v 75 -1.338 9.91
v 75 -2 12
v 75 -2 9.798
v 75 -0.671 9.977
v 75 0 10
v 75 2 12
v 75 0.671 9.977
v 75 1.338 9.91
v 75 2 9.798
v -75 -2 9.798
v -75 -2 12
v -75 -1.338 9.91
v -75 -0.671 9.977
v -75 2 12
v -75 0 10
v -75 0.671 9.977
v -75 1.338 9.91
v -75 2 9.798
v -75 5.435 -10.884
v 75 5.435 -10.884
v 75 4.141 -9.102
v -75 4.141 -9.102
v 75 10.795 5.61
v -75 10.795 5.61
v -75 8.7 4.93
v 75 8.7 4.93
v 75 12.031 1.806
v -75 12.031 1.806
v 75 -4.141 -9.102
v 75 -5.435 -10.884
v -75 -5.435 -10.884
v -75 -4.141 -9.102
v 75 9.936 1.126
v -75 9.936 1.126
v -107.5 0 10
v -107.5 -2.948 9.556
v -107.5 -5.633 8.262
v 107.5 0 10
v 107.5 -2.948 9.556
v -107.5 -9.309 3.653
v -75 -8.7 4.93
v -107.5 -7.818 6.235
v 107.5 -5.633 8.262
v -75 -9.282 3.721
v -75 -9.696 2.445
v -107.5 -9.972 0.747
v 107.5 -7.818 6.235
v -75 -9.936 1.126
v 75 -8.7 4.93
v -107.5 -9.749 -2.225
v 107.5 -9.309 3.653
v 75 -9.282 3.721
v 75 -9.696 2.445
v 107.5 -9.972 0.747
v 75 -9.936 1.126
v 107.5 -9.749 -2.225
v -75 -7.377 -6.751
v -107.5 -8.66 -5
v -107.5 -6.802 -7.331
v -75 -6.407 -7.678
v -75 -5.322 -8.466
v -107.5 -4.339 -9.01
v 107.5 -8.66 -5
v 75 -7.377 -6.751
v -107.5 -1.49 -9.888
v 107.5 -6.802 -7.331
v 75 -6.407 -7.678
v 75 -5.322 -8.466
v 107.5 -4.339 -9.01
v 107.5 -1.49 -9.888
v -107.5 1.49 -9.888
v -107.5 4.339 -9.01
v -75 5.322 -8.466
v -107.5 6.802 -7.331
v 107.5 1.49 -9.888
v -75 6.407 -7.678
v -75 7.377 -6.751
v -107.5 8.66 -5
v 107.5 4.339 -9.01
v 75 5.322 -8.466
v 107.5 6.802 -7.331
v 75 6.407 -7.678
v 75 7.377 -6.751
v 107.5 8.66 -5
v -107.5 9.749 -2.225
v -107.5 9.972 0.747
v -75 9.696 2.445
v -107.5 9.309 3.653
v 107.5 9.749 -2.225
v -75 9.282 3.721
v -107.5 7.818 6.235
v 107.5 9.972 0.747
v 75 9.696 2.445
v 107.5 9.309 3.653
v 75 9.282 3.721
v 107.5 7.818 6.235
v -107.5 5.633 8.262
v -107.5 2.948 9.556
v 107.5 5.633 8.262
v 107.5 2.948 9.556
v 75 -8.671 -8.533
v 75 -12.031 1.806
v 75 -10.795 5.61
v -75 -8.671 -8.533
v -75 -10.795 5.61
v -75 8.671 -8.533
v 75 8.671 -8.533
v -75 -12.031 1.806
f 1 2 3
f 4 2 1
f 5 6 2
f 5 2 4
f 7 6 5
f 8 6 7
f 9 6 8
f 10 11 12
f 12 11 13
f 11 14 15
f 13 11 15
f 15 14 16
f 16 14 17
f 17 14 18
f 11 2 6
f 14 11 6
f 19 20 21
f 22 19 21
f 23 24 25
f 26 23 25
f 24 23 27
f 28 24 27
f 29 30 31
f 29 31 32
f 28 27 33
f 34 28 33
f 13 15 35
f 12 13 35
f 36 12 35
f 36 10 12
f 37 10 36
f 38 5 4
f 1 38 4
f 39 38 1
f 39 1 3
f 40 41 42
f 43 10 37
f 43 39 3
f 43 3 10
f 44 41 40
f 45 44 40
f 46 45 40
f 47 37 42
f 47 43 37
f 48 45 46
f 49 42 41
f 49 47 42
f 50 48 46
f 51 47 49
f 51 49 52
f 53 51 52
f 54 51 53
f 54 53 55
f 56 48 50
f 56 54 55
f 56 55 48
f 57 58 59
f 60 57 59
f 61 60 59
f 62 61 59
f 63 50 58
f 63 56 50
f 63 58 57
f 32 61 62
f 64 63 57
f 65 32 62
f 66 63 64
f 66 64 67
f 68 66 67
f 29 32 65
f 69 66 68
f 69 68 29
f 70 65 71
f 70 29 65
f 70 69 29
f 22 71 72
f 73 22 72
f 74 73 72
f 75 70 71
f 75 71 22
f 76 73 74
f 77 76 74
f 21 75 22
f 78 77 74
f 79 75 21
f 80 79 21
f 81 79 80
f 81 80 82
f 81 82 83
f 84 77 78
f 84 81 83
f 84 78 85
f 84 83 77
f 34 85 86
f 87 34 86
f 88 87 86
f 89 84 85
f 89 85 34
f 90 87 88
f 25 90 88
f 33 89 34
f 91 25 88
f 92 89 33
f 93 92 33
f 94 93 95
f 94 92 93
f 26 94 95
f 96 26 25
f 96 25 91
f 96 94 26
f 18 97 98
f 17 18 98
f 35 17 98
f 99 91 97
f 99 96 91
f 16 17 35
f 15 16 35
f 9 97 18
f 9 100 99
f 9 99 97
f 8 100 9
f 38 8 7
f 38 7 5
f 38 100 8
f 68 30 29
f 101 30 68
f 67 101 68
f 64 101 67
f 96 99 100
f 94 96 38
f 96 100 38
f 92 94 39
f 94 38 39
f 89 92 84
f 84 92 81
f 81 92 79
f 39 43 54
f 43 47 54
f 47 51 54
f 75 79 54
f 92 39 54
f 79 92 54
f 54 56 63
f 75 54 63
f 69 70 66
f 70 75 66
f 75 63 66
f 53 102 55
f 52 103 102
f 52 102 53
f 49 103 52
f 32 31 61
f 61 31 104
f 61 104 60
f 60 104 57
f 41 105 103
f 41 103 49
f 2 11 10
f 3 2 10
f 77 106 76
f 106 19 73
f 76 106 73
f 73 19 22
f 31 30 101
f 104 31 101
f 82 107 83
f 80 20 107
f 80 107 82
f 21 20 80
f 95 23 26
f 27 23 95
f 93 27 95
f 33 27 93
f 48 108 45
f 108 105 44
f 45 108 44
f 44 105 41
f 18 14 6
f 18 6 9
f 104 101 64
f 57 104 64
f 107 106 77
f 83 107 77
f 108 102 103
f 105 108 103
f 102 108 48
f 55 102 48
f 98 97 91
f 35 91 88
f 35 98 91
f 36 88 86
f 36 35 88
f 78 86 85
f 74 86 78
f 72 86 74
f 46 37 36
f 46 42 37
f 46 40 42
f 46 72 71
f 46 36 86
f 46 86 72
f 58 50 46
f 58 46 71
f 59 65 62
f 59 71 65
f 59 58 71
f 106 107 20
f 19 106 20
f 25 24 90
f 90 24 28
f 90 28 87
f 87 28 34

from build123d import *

# Parameters (mm, degrees)
SKETCH1_W           = 215
SKETCH1_H           = 10
SKETCH2_W           = 4
SKETCH2_H           = 4
BOSS_EXTRUDE1_DEPTH = 75
CIRPATTERN1_COUNT   = 5


with BuildPart() as part:
    # Sketch1 → Revolve1 (revolve)
    with BuildSketch(Plane.XY, mode=Mode.PRIVATE) as revolve1_sk:
        with Locations((0, 5)):
            Rectangle(SKETCH1_W, SKETCH1_H)
    revolve(revolve1_sk.sketch.rotate(Axis((0, 0, 0), (1, 0, 0)), 90), axis=Axis((0, 0, 0), (1, 0, 0)))

    # Sketch2 → Boss-Extrude1 (add, symmetric)
    with BuildSketch(Plane(origin=(0, 0, 0), x_dir=(0, 0, -1), z_dir=(1, 0, 0))):
        with Locations((-10, 0)):
            Rectangle(SKETCH2_W, SKETCH2_H)
    boss_extrude1 = extrude(amount=BOSS_EXTRUDE1_DEPTH, both=True)

    # CirPattern1: Boss-Extrude1 ×5 about axis
    cirpattern1_axis = Axis((0, 0, 0), (1, 0, 0))
    for i in range(1, CIRPATTERN1_COUNT):
        add(boss_extrude1.rotate(cirpattern1_axis, i * 360 / CIRPATTERN1_COUNT))


solid = part.part
